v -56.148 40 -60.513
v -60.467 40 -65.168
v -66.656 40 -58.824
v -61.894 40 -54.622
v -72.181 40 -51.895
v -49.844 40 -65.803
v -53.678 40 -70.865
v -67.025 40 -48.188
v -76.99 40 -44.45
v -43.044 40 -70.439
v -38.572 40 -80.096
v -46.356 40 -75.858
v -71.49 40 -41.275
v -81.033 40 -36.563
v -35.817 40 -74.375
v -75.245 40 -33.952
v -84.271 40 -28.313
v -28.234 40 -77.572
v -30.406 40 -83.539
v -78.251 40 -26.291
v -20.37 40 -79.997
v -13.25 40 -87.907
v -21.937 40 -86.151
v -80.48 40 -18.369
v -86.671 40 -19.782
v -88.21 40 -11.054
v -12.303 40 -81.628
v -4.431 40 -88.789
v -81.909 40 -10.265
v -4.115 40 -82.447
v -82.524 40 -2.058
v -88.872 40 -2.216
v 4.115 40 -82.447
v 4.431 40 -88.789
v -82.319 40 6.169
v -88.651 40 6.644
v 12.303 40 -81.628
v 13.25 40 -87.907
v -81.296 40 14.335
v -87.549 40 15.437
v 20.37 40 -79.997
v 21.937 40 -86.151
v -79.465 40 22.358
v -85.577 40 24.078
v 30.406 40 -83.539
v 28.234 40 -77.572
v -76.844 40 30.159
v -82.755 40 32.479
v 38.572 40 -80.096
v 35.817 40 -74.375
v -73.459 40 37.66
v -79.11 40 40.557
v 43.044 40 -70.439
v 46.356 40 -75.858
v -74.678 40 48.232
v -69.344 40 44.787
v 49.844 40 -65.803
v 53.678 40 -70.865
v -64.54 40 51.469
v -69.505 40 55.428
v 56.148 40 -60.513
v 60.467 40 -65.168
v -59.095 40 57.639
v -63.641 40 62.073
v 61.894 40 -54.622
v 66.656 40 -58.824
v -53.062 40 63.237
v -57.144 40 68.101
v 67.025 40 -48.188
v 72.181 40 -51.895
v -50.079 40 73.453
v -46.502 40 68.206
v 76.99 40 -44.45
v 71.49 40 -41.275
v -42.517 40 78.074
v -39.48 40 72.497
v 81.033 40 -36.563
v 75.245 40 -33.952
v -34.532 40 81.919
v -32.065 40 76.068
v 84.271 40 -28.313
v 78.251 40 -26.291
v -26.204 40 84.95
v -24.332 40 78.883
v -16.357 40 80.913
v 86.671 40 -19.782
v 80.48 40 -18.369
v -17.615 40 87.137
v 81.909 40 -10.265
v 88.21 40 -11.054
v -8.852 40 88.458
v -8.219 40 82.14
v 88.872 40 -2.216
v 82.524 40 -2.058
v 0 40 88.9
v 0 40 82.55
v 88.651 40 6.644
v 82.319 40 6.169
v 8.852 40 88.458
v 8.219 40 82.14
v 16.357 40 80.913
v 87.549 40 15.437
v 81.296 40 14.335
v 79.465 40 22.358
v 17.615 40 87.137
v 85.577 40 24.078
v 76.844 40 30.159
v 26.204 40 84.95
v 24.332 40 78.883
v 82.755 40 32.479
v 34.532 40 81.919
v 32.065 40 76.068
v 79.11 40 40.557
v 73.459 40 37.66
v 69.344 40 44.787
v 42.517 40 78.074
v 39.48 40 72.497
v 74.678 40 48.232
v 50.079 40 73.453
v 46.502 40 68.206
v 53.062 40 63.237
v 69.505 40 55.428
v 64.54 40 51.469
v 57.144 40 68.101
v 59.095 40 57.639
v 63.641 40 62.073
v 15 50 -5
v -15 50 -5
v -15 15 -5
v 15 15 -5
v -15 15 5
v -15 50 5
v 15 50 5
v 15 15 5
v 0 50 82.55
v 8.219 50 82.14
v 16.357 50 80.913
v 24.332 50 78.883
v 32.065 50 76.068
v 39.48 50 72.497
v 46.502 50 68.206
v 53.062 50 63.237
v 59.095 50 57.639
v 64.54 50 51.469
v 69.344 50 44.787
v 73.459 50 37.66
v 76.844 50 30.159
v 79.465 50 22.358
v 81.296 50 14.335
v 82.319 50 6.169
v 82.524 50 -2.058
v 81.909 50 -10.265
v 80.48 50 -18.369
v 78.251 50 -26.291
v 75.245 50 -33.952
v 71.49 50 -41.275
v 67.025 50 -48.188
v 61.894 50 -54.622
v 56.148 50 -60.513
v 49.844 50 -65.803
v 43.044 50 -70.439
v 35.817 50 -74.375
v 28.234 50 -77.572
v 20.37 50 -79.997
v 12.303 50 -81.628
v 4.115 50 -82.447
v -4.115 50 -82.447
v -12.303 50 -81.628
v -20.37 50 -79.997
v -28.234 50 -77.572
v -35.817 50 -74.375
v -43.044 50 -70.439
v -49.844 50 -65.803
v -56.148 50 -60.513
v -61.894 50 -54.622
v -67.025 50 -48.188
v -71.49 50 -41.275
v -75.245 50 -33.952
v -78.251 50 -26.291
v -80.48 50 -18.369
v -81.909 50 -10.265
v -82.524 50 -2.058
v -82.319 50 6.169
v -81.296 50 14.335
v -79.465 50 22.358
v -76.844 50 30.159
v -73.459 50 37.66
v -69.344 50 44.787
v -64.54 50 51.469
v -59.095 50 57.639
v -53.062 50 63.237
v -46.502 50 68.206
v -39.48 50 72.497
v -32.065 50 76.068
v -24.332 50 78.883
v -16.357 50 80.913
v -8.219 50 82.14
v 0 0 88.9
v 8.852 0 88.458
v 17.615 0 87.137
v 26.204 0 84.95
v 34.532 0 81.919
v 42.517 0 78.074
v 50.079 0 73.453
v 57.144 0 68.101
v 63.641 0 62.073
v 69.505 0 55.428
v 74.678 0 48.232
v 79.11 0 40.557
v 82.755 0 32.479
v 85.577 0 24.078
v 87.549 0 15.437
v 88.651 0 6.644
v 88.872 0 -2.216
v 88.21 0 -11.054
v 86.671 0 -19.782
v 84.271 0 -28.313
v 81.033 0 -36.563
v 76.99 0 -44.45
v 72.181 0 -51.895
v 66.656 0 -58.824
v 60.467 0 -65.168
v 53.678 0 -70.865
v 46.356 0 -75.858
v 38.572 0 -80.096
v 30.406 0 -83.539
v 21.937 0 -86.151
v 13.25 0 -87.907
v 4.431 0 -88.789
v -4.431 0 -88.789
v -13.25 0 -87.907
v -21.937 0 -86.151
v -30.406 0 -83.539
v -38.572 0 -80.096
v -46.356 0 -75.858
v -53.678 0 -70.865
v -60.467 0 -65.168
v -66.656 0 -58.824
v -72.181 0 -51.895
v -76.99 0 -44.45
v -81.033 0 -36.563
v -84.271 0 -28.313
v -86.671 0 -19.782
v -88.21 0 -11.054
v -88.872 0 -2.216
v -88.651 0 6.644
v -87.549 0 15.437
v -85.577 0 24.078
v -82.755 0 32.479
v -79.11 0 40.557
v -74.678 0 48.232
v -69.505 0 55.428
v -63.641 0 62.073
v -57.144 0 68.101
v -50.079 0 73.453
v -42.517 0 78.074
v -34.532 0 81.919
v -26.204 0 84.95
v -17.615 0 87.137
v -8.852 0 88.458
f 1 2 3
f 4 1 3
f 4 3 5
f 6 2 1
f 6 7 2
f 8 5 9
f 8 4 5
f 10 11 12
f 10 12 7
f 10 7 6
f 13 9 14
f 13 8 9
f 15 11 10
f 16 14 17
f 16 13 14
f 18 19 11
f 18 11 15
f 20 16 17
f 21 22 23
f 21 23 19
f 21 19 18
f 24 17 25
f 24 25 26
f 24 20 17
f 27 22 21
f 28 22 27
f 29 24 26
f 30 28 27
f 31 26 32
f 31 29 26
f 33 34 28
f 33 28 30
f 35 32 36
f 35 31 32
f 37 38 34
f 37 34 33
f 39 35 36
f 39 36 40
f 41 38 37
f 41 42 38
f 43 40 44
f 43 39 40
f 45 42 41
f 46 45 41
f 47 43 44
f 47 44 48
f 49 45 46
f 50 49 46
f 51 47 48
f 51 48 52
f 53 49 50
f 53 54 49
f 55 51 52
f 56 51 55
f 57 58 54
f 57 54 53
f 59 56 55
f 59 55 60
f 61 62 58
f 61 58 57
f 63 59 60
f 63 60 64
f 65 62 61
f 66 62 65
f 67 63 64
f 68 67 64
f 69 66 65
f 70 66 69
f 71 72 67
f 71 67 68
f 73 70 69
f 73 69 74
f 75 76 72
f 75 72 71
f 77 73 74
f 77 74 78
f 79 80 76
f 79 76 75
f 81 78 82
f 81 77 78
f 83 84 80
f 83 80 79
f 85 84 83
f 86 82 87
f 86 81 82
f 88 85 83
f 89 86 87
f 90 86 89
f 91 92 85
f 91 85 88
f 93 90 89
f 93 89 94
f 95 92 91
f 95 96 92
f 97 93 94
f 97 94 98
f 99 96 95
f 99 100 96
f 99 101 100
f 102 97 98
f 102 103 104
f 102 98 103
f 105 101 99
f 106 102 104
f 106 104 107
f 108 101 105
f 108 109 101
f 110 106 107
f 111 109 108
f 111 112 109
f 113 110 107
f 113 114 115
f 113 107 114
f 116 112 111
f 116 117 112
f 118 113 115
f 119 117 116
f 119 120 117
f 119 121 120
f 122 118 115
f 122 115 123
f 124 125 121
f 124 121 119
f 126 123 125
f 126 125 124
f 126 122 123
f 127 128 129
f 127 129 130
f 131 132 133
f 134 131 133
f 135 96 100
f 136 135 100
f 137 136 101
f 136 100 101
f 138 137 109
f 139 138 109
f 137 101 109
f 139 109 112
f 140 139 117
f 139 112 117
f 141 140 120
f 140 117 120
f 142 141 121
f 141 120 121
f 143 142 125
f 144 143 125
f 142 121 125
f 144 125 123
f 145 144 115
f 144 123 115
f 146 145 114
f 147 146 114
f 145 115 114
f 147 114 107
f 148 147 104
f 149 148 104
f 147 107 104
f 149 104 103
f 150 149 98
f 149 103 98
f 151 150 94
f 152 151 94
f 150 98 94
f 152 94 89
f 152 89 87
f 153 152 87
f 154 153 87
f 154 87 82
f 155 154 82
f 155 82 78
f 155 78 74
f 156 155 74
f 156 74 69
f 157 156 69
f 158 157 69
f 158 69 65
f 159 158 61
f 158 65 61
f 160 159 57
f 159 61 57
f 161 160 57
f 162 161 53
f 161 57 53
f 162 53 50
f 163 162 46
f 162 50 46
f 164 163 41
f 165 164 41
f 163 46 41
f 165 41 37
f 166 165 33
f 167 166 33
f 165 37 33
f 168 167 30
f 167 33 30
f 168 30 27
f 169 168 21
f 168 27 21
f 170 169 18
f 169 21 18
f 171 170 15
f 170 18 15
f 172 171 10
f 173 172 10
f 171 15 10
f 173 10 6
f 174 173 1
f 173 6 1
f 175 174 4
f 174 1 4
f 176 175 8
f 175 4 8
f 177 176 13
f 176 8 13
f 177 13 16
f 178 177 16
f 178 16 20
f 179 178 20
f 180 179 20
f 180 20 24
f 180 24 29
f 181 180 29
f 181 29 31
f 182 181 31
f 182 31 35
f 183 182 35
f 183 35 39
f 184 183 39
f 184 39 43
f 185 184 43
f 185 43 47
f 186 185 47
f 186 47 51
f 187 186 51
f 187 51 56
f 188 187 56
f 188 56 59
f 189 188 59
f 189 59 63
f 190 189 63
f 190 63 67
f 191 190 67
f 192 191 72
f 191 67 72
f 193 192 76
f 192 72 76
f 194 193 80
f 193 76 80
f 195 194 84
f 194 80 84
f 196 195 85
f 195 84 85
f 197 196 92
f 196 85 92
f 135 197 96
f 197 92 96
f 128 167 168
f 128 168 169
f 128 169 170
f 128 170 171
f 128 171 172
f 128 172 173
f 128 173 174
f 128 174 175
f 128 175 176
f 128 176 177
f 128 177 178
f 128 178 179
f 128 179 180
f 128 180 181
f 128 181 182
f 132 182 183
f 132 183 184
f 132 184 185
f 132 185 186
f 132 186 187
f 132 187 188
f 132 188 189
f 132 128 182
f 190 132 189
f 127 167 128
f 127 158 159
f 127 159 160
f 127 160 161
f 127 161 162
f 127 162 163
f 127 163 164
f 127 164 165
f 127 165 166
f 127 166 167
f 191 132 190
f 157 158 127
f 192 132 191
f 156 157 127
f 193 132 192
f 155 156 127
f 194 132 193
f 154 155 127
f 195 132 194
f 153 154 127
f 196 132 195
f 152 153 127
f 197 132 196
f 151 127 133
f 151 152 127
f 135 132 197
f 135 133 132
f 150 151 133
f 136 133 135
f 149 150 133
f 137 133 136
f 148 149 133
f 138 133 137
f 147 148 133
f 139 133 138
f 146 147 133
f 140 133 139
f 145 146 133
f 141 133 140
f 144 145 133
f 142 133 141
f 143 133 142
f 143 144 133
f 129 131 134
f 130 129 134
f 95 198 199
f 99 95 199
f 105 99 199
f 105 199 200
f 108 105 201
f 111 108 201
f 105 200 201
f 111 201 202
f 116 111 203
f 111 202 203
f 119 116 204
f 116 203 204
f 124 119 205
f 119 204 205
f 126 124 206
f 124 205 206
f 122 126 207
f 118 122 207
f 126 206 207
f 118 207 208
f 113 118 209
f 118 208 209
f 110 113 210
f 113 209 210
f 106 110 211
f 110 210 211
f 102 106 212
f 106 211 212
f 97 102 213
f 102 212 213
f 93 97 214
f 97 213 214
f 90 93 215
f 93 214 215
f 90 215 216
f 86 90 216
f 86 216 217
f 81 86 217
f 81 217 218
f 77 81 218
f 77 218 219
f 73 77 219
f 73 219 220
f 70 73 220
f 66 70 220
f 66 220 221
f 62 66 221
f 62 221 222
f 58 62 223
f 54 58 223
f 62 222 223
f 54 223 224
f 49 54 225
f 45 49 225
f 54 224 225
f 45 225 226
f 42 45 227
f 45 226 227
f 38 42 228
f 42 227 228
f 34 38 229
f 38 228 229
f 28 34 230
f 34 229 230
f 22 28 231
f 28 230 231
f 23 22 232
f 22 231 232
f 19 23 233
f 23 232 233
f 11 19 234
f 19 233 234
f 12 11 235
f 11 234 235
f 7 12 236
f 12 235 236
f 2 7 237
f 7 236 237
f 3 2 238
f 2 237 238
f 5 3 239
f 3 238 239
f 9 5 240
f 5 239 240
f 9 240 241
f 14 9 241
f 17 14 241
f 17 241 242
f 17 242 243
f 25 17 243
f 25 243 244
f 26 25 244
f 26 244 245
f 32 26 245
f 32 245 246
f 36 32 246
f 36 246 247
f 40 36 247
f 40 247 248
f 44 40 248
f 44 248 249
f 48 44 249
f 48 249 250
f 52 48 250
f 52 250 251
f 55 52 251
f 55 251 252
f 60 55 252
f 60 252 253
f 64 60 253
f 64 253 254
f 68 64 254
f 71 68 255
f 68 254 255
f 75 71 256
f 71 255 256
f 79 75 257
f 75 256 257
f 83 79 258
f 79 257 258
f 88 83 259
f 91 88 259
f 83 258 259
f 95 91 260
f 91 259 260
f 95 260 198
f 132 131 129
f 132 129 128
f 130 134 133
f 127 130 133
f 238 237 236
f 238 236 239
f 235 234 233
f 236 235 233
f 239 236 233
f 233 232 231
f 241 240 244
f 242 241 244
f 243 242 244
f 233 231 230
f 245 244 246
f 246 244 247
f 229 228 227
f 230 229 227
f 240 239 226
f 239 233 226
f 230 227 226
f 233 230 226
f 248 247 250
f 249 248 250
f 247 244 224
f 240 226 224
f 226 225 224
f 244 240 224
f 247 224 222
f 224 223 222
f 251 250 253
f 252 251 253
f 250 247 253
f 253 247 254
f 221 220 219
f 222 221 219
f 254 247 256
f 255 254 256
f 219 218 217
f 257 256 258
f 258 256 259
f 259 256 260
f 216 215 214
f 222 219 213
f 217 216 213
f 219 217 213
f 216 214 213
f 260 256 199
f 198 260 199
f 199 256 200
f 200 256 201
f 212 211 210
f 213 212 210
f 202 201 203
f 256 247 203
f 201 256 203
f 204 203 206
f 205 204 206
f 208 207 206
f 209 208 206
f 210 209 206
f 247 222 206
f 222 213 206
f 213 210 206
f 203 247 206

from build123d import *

# Parameters (mm, degrees)
SKETCH1_R           = 88.9
BOSS_EXTRUDE1_DEPTH = 40
SKETCH2_R           = 82.55
BOSS_EXTRUDE2_DEPTH = 10
SKETCH3_W           = 30
SKETCH3_H           = 35
CUT_EXTRUDE1_DEPTH  = 5


with BuildPart() as part:
    # Sketch1 → Boss-Extrude1 (new body)
    with BuildSketch(Plane(origin=(0, 0, 0), x_dir=(1, 0, 0), z_dir=(0, 1, 0))):
        with Locations(Location((0, 0, 0), (0, 0, 270))):
            Circle(SKETCH1_R)
    extrude(amount=BOSS_EXTRUDE1_DEPTH)

    # Sketch2 → Boss-Extrude2 (add)
    with BuildSketch(Plane(origin=(0, 40, 0), x_dir=(1, 0, 0), z_dir=(0, 1, 0))):
        with Locations(Location((0, 0, 0), (0, 0, 270))):
            Circle(SKETCH2_R)
    extrude(amount=BOSS_EXTRUDE2_DEPTH)

    # Sketch3 → Cut-Extrude1 (cut, symmetric)
    with BuildSketch(Plane.XY):
        with Locations((0, 32.5)):
            Rectangle(SKETCH3_W, SKETCH3_H)
    extrude(amount=CUT_EXTRUDE1_DEPTH, both=True, mode=Mode.SUBTRACT)


solid = part.part
